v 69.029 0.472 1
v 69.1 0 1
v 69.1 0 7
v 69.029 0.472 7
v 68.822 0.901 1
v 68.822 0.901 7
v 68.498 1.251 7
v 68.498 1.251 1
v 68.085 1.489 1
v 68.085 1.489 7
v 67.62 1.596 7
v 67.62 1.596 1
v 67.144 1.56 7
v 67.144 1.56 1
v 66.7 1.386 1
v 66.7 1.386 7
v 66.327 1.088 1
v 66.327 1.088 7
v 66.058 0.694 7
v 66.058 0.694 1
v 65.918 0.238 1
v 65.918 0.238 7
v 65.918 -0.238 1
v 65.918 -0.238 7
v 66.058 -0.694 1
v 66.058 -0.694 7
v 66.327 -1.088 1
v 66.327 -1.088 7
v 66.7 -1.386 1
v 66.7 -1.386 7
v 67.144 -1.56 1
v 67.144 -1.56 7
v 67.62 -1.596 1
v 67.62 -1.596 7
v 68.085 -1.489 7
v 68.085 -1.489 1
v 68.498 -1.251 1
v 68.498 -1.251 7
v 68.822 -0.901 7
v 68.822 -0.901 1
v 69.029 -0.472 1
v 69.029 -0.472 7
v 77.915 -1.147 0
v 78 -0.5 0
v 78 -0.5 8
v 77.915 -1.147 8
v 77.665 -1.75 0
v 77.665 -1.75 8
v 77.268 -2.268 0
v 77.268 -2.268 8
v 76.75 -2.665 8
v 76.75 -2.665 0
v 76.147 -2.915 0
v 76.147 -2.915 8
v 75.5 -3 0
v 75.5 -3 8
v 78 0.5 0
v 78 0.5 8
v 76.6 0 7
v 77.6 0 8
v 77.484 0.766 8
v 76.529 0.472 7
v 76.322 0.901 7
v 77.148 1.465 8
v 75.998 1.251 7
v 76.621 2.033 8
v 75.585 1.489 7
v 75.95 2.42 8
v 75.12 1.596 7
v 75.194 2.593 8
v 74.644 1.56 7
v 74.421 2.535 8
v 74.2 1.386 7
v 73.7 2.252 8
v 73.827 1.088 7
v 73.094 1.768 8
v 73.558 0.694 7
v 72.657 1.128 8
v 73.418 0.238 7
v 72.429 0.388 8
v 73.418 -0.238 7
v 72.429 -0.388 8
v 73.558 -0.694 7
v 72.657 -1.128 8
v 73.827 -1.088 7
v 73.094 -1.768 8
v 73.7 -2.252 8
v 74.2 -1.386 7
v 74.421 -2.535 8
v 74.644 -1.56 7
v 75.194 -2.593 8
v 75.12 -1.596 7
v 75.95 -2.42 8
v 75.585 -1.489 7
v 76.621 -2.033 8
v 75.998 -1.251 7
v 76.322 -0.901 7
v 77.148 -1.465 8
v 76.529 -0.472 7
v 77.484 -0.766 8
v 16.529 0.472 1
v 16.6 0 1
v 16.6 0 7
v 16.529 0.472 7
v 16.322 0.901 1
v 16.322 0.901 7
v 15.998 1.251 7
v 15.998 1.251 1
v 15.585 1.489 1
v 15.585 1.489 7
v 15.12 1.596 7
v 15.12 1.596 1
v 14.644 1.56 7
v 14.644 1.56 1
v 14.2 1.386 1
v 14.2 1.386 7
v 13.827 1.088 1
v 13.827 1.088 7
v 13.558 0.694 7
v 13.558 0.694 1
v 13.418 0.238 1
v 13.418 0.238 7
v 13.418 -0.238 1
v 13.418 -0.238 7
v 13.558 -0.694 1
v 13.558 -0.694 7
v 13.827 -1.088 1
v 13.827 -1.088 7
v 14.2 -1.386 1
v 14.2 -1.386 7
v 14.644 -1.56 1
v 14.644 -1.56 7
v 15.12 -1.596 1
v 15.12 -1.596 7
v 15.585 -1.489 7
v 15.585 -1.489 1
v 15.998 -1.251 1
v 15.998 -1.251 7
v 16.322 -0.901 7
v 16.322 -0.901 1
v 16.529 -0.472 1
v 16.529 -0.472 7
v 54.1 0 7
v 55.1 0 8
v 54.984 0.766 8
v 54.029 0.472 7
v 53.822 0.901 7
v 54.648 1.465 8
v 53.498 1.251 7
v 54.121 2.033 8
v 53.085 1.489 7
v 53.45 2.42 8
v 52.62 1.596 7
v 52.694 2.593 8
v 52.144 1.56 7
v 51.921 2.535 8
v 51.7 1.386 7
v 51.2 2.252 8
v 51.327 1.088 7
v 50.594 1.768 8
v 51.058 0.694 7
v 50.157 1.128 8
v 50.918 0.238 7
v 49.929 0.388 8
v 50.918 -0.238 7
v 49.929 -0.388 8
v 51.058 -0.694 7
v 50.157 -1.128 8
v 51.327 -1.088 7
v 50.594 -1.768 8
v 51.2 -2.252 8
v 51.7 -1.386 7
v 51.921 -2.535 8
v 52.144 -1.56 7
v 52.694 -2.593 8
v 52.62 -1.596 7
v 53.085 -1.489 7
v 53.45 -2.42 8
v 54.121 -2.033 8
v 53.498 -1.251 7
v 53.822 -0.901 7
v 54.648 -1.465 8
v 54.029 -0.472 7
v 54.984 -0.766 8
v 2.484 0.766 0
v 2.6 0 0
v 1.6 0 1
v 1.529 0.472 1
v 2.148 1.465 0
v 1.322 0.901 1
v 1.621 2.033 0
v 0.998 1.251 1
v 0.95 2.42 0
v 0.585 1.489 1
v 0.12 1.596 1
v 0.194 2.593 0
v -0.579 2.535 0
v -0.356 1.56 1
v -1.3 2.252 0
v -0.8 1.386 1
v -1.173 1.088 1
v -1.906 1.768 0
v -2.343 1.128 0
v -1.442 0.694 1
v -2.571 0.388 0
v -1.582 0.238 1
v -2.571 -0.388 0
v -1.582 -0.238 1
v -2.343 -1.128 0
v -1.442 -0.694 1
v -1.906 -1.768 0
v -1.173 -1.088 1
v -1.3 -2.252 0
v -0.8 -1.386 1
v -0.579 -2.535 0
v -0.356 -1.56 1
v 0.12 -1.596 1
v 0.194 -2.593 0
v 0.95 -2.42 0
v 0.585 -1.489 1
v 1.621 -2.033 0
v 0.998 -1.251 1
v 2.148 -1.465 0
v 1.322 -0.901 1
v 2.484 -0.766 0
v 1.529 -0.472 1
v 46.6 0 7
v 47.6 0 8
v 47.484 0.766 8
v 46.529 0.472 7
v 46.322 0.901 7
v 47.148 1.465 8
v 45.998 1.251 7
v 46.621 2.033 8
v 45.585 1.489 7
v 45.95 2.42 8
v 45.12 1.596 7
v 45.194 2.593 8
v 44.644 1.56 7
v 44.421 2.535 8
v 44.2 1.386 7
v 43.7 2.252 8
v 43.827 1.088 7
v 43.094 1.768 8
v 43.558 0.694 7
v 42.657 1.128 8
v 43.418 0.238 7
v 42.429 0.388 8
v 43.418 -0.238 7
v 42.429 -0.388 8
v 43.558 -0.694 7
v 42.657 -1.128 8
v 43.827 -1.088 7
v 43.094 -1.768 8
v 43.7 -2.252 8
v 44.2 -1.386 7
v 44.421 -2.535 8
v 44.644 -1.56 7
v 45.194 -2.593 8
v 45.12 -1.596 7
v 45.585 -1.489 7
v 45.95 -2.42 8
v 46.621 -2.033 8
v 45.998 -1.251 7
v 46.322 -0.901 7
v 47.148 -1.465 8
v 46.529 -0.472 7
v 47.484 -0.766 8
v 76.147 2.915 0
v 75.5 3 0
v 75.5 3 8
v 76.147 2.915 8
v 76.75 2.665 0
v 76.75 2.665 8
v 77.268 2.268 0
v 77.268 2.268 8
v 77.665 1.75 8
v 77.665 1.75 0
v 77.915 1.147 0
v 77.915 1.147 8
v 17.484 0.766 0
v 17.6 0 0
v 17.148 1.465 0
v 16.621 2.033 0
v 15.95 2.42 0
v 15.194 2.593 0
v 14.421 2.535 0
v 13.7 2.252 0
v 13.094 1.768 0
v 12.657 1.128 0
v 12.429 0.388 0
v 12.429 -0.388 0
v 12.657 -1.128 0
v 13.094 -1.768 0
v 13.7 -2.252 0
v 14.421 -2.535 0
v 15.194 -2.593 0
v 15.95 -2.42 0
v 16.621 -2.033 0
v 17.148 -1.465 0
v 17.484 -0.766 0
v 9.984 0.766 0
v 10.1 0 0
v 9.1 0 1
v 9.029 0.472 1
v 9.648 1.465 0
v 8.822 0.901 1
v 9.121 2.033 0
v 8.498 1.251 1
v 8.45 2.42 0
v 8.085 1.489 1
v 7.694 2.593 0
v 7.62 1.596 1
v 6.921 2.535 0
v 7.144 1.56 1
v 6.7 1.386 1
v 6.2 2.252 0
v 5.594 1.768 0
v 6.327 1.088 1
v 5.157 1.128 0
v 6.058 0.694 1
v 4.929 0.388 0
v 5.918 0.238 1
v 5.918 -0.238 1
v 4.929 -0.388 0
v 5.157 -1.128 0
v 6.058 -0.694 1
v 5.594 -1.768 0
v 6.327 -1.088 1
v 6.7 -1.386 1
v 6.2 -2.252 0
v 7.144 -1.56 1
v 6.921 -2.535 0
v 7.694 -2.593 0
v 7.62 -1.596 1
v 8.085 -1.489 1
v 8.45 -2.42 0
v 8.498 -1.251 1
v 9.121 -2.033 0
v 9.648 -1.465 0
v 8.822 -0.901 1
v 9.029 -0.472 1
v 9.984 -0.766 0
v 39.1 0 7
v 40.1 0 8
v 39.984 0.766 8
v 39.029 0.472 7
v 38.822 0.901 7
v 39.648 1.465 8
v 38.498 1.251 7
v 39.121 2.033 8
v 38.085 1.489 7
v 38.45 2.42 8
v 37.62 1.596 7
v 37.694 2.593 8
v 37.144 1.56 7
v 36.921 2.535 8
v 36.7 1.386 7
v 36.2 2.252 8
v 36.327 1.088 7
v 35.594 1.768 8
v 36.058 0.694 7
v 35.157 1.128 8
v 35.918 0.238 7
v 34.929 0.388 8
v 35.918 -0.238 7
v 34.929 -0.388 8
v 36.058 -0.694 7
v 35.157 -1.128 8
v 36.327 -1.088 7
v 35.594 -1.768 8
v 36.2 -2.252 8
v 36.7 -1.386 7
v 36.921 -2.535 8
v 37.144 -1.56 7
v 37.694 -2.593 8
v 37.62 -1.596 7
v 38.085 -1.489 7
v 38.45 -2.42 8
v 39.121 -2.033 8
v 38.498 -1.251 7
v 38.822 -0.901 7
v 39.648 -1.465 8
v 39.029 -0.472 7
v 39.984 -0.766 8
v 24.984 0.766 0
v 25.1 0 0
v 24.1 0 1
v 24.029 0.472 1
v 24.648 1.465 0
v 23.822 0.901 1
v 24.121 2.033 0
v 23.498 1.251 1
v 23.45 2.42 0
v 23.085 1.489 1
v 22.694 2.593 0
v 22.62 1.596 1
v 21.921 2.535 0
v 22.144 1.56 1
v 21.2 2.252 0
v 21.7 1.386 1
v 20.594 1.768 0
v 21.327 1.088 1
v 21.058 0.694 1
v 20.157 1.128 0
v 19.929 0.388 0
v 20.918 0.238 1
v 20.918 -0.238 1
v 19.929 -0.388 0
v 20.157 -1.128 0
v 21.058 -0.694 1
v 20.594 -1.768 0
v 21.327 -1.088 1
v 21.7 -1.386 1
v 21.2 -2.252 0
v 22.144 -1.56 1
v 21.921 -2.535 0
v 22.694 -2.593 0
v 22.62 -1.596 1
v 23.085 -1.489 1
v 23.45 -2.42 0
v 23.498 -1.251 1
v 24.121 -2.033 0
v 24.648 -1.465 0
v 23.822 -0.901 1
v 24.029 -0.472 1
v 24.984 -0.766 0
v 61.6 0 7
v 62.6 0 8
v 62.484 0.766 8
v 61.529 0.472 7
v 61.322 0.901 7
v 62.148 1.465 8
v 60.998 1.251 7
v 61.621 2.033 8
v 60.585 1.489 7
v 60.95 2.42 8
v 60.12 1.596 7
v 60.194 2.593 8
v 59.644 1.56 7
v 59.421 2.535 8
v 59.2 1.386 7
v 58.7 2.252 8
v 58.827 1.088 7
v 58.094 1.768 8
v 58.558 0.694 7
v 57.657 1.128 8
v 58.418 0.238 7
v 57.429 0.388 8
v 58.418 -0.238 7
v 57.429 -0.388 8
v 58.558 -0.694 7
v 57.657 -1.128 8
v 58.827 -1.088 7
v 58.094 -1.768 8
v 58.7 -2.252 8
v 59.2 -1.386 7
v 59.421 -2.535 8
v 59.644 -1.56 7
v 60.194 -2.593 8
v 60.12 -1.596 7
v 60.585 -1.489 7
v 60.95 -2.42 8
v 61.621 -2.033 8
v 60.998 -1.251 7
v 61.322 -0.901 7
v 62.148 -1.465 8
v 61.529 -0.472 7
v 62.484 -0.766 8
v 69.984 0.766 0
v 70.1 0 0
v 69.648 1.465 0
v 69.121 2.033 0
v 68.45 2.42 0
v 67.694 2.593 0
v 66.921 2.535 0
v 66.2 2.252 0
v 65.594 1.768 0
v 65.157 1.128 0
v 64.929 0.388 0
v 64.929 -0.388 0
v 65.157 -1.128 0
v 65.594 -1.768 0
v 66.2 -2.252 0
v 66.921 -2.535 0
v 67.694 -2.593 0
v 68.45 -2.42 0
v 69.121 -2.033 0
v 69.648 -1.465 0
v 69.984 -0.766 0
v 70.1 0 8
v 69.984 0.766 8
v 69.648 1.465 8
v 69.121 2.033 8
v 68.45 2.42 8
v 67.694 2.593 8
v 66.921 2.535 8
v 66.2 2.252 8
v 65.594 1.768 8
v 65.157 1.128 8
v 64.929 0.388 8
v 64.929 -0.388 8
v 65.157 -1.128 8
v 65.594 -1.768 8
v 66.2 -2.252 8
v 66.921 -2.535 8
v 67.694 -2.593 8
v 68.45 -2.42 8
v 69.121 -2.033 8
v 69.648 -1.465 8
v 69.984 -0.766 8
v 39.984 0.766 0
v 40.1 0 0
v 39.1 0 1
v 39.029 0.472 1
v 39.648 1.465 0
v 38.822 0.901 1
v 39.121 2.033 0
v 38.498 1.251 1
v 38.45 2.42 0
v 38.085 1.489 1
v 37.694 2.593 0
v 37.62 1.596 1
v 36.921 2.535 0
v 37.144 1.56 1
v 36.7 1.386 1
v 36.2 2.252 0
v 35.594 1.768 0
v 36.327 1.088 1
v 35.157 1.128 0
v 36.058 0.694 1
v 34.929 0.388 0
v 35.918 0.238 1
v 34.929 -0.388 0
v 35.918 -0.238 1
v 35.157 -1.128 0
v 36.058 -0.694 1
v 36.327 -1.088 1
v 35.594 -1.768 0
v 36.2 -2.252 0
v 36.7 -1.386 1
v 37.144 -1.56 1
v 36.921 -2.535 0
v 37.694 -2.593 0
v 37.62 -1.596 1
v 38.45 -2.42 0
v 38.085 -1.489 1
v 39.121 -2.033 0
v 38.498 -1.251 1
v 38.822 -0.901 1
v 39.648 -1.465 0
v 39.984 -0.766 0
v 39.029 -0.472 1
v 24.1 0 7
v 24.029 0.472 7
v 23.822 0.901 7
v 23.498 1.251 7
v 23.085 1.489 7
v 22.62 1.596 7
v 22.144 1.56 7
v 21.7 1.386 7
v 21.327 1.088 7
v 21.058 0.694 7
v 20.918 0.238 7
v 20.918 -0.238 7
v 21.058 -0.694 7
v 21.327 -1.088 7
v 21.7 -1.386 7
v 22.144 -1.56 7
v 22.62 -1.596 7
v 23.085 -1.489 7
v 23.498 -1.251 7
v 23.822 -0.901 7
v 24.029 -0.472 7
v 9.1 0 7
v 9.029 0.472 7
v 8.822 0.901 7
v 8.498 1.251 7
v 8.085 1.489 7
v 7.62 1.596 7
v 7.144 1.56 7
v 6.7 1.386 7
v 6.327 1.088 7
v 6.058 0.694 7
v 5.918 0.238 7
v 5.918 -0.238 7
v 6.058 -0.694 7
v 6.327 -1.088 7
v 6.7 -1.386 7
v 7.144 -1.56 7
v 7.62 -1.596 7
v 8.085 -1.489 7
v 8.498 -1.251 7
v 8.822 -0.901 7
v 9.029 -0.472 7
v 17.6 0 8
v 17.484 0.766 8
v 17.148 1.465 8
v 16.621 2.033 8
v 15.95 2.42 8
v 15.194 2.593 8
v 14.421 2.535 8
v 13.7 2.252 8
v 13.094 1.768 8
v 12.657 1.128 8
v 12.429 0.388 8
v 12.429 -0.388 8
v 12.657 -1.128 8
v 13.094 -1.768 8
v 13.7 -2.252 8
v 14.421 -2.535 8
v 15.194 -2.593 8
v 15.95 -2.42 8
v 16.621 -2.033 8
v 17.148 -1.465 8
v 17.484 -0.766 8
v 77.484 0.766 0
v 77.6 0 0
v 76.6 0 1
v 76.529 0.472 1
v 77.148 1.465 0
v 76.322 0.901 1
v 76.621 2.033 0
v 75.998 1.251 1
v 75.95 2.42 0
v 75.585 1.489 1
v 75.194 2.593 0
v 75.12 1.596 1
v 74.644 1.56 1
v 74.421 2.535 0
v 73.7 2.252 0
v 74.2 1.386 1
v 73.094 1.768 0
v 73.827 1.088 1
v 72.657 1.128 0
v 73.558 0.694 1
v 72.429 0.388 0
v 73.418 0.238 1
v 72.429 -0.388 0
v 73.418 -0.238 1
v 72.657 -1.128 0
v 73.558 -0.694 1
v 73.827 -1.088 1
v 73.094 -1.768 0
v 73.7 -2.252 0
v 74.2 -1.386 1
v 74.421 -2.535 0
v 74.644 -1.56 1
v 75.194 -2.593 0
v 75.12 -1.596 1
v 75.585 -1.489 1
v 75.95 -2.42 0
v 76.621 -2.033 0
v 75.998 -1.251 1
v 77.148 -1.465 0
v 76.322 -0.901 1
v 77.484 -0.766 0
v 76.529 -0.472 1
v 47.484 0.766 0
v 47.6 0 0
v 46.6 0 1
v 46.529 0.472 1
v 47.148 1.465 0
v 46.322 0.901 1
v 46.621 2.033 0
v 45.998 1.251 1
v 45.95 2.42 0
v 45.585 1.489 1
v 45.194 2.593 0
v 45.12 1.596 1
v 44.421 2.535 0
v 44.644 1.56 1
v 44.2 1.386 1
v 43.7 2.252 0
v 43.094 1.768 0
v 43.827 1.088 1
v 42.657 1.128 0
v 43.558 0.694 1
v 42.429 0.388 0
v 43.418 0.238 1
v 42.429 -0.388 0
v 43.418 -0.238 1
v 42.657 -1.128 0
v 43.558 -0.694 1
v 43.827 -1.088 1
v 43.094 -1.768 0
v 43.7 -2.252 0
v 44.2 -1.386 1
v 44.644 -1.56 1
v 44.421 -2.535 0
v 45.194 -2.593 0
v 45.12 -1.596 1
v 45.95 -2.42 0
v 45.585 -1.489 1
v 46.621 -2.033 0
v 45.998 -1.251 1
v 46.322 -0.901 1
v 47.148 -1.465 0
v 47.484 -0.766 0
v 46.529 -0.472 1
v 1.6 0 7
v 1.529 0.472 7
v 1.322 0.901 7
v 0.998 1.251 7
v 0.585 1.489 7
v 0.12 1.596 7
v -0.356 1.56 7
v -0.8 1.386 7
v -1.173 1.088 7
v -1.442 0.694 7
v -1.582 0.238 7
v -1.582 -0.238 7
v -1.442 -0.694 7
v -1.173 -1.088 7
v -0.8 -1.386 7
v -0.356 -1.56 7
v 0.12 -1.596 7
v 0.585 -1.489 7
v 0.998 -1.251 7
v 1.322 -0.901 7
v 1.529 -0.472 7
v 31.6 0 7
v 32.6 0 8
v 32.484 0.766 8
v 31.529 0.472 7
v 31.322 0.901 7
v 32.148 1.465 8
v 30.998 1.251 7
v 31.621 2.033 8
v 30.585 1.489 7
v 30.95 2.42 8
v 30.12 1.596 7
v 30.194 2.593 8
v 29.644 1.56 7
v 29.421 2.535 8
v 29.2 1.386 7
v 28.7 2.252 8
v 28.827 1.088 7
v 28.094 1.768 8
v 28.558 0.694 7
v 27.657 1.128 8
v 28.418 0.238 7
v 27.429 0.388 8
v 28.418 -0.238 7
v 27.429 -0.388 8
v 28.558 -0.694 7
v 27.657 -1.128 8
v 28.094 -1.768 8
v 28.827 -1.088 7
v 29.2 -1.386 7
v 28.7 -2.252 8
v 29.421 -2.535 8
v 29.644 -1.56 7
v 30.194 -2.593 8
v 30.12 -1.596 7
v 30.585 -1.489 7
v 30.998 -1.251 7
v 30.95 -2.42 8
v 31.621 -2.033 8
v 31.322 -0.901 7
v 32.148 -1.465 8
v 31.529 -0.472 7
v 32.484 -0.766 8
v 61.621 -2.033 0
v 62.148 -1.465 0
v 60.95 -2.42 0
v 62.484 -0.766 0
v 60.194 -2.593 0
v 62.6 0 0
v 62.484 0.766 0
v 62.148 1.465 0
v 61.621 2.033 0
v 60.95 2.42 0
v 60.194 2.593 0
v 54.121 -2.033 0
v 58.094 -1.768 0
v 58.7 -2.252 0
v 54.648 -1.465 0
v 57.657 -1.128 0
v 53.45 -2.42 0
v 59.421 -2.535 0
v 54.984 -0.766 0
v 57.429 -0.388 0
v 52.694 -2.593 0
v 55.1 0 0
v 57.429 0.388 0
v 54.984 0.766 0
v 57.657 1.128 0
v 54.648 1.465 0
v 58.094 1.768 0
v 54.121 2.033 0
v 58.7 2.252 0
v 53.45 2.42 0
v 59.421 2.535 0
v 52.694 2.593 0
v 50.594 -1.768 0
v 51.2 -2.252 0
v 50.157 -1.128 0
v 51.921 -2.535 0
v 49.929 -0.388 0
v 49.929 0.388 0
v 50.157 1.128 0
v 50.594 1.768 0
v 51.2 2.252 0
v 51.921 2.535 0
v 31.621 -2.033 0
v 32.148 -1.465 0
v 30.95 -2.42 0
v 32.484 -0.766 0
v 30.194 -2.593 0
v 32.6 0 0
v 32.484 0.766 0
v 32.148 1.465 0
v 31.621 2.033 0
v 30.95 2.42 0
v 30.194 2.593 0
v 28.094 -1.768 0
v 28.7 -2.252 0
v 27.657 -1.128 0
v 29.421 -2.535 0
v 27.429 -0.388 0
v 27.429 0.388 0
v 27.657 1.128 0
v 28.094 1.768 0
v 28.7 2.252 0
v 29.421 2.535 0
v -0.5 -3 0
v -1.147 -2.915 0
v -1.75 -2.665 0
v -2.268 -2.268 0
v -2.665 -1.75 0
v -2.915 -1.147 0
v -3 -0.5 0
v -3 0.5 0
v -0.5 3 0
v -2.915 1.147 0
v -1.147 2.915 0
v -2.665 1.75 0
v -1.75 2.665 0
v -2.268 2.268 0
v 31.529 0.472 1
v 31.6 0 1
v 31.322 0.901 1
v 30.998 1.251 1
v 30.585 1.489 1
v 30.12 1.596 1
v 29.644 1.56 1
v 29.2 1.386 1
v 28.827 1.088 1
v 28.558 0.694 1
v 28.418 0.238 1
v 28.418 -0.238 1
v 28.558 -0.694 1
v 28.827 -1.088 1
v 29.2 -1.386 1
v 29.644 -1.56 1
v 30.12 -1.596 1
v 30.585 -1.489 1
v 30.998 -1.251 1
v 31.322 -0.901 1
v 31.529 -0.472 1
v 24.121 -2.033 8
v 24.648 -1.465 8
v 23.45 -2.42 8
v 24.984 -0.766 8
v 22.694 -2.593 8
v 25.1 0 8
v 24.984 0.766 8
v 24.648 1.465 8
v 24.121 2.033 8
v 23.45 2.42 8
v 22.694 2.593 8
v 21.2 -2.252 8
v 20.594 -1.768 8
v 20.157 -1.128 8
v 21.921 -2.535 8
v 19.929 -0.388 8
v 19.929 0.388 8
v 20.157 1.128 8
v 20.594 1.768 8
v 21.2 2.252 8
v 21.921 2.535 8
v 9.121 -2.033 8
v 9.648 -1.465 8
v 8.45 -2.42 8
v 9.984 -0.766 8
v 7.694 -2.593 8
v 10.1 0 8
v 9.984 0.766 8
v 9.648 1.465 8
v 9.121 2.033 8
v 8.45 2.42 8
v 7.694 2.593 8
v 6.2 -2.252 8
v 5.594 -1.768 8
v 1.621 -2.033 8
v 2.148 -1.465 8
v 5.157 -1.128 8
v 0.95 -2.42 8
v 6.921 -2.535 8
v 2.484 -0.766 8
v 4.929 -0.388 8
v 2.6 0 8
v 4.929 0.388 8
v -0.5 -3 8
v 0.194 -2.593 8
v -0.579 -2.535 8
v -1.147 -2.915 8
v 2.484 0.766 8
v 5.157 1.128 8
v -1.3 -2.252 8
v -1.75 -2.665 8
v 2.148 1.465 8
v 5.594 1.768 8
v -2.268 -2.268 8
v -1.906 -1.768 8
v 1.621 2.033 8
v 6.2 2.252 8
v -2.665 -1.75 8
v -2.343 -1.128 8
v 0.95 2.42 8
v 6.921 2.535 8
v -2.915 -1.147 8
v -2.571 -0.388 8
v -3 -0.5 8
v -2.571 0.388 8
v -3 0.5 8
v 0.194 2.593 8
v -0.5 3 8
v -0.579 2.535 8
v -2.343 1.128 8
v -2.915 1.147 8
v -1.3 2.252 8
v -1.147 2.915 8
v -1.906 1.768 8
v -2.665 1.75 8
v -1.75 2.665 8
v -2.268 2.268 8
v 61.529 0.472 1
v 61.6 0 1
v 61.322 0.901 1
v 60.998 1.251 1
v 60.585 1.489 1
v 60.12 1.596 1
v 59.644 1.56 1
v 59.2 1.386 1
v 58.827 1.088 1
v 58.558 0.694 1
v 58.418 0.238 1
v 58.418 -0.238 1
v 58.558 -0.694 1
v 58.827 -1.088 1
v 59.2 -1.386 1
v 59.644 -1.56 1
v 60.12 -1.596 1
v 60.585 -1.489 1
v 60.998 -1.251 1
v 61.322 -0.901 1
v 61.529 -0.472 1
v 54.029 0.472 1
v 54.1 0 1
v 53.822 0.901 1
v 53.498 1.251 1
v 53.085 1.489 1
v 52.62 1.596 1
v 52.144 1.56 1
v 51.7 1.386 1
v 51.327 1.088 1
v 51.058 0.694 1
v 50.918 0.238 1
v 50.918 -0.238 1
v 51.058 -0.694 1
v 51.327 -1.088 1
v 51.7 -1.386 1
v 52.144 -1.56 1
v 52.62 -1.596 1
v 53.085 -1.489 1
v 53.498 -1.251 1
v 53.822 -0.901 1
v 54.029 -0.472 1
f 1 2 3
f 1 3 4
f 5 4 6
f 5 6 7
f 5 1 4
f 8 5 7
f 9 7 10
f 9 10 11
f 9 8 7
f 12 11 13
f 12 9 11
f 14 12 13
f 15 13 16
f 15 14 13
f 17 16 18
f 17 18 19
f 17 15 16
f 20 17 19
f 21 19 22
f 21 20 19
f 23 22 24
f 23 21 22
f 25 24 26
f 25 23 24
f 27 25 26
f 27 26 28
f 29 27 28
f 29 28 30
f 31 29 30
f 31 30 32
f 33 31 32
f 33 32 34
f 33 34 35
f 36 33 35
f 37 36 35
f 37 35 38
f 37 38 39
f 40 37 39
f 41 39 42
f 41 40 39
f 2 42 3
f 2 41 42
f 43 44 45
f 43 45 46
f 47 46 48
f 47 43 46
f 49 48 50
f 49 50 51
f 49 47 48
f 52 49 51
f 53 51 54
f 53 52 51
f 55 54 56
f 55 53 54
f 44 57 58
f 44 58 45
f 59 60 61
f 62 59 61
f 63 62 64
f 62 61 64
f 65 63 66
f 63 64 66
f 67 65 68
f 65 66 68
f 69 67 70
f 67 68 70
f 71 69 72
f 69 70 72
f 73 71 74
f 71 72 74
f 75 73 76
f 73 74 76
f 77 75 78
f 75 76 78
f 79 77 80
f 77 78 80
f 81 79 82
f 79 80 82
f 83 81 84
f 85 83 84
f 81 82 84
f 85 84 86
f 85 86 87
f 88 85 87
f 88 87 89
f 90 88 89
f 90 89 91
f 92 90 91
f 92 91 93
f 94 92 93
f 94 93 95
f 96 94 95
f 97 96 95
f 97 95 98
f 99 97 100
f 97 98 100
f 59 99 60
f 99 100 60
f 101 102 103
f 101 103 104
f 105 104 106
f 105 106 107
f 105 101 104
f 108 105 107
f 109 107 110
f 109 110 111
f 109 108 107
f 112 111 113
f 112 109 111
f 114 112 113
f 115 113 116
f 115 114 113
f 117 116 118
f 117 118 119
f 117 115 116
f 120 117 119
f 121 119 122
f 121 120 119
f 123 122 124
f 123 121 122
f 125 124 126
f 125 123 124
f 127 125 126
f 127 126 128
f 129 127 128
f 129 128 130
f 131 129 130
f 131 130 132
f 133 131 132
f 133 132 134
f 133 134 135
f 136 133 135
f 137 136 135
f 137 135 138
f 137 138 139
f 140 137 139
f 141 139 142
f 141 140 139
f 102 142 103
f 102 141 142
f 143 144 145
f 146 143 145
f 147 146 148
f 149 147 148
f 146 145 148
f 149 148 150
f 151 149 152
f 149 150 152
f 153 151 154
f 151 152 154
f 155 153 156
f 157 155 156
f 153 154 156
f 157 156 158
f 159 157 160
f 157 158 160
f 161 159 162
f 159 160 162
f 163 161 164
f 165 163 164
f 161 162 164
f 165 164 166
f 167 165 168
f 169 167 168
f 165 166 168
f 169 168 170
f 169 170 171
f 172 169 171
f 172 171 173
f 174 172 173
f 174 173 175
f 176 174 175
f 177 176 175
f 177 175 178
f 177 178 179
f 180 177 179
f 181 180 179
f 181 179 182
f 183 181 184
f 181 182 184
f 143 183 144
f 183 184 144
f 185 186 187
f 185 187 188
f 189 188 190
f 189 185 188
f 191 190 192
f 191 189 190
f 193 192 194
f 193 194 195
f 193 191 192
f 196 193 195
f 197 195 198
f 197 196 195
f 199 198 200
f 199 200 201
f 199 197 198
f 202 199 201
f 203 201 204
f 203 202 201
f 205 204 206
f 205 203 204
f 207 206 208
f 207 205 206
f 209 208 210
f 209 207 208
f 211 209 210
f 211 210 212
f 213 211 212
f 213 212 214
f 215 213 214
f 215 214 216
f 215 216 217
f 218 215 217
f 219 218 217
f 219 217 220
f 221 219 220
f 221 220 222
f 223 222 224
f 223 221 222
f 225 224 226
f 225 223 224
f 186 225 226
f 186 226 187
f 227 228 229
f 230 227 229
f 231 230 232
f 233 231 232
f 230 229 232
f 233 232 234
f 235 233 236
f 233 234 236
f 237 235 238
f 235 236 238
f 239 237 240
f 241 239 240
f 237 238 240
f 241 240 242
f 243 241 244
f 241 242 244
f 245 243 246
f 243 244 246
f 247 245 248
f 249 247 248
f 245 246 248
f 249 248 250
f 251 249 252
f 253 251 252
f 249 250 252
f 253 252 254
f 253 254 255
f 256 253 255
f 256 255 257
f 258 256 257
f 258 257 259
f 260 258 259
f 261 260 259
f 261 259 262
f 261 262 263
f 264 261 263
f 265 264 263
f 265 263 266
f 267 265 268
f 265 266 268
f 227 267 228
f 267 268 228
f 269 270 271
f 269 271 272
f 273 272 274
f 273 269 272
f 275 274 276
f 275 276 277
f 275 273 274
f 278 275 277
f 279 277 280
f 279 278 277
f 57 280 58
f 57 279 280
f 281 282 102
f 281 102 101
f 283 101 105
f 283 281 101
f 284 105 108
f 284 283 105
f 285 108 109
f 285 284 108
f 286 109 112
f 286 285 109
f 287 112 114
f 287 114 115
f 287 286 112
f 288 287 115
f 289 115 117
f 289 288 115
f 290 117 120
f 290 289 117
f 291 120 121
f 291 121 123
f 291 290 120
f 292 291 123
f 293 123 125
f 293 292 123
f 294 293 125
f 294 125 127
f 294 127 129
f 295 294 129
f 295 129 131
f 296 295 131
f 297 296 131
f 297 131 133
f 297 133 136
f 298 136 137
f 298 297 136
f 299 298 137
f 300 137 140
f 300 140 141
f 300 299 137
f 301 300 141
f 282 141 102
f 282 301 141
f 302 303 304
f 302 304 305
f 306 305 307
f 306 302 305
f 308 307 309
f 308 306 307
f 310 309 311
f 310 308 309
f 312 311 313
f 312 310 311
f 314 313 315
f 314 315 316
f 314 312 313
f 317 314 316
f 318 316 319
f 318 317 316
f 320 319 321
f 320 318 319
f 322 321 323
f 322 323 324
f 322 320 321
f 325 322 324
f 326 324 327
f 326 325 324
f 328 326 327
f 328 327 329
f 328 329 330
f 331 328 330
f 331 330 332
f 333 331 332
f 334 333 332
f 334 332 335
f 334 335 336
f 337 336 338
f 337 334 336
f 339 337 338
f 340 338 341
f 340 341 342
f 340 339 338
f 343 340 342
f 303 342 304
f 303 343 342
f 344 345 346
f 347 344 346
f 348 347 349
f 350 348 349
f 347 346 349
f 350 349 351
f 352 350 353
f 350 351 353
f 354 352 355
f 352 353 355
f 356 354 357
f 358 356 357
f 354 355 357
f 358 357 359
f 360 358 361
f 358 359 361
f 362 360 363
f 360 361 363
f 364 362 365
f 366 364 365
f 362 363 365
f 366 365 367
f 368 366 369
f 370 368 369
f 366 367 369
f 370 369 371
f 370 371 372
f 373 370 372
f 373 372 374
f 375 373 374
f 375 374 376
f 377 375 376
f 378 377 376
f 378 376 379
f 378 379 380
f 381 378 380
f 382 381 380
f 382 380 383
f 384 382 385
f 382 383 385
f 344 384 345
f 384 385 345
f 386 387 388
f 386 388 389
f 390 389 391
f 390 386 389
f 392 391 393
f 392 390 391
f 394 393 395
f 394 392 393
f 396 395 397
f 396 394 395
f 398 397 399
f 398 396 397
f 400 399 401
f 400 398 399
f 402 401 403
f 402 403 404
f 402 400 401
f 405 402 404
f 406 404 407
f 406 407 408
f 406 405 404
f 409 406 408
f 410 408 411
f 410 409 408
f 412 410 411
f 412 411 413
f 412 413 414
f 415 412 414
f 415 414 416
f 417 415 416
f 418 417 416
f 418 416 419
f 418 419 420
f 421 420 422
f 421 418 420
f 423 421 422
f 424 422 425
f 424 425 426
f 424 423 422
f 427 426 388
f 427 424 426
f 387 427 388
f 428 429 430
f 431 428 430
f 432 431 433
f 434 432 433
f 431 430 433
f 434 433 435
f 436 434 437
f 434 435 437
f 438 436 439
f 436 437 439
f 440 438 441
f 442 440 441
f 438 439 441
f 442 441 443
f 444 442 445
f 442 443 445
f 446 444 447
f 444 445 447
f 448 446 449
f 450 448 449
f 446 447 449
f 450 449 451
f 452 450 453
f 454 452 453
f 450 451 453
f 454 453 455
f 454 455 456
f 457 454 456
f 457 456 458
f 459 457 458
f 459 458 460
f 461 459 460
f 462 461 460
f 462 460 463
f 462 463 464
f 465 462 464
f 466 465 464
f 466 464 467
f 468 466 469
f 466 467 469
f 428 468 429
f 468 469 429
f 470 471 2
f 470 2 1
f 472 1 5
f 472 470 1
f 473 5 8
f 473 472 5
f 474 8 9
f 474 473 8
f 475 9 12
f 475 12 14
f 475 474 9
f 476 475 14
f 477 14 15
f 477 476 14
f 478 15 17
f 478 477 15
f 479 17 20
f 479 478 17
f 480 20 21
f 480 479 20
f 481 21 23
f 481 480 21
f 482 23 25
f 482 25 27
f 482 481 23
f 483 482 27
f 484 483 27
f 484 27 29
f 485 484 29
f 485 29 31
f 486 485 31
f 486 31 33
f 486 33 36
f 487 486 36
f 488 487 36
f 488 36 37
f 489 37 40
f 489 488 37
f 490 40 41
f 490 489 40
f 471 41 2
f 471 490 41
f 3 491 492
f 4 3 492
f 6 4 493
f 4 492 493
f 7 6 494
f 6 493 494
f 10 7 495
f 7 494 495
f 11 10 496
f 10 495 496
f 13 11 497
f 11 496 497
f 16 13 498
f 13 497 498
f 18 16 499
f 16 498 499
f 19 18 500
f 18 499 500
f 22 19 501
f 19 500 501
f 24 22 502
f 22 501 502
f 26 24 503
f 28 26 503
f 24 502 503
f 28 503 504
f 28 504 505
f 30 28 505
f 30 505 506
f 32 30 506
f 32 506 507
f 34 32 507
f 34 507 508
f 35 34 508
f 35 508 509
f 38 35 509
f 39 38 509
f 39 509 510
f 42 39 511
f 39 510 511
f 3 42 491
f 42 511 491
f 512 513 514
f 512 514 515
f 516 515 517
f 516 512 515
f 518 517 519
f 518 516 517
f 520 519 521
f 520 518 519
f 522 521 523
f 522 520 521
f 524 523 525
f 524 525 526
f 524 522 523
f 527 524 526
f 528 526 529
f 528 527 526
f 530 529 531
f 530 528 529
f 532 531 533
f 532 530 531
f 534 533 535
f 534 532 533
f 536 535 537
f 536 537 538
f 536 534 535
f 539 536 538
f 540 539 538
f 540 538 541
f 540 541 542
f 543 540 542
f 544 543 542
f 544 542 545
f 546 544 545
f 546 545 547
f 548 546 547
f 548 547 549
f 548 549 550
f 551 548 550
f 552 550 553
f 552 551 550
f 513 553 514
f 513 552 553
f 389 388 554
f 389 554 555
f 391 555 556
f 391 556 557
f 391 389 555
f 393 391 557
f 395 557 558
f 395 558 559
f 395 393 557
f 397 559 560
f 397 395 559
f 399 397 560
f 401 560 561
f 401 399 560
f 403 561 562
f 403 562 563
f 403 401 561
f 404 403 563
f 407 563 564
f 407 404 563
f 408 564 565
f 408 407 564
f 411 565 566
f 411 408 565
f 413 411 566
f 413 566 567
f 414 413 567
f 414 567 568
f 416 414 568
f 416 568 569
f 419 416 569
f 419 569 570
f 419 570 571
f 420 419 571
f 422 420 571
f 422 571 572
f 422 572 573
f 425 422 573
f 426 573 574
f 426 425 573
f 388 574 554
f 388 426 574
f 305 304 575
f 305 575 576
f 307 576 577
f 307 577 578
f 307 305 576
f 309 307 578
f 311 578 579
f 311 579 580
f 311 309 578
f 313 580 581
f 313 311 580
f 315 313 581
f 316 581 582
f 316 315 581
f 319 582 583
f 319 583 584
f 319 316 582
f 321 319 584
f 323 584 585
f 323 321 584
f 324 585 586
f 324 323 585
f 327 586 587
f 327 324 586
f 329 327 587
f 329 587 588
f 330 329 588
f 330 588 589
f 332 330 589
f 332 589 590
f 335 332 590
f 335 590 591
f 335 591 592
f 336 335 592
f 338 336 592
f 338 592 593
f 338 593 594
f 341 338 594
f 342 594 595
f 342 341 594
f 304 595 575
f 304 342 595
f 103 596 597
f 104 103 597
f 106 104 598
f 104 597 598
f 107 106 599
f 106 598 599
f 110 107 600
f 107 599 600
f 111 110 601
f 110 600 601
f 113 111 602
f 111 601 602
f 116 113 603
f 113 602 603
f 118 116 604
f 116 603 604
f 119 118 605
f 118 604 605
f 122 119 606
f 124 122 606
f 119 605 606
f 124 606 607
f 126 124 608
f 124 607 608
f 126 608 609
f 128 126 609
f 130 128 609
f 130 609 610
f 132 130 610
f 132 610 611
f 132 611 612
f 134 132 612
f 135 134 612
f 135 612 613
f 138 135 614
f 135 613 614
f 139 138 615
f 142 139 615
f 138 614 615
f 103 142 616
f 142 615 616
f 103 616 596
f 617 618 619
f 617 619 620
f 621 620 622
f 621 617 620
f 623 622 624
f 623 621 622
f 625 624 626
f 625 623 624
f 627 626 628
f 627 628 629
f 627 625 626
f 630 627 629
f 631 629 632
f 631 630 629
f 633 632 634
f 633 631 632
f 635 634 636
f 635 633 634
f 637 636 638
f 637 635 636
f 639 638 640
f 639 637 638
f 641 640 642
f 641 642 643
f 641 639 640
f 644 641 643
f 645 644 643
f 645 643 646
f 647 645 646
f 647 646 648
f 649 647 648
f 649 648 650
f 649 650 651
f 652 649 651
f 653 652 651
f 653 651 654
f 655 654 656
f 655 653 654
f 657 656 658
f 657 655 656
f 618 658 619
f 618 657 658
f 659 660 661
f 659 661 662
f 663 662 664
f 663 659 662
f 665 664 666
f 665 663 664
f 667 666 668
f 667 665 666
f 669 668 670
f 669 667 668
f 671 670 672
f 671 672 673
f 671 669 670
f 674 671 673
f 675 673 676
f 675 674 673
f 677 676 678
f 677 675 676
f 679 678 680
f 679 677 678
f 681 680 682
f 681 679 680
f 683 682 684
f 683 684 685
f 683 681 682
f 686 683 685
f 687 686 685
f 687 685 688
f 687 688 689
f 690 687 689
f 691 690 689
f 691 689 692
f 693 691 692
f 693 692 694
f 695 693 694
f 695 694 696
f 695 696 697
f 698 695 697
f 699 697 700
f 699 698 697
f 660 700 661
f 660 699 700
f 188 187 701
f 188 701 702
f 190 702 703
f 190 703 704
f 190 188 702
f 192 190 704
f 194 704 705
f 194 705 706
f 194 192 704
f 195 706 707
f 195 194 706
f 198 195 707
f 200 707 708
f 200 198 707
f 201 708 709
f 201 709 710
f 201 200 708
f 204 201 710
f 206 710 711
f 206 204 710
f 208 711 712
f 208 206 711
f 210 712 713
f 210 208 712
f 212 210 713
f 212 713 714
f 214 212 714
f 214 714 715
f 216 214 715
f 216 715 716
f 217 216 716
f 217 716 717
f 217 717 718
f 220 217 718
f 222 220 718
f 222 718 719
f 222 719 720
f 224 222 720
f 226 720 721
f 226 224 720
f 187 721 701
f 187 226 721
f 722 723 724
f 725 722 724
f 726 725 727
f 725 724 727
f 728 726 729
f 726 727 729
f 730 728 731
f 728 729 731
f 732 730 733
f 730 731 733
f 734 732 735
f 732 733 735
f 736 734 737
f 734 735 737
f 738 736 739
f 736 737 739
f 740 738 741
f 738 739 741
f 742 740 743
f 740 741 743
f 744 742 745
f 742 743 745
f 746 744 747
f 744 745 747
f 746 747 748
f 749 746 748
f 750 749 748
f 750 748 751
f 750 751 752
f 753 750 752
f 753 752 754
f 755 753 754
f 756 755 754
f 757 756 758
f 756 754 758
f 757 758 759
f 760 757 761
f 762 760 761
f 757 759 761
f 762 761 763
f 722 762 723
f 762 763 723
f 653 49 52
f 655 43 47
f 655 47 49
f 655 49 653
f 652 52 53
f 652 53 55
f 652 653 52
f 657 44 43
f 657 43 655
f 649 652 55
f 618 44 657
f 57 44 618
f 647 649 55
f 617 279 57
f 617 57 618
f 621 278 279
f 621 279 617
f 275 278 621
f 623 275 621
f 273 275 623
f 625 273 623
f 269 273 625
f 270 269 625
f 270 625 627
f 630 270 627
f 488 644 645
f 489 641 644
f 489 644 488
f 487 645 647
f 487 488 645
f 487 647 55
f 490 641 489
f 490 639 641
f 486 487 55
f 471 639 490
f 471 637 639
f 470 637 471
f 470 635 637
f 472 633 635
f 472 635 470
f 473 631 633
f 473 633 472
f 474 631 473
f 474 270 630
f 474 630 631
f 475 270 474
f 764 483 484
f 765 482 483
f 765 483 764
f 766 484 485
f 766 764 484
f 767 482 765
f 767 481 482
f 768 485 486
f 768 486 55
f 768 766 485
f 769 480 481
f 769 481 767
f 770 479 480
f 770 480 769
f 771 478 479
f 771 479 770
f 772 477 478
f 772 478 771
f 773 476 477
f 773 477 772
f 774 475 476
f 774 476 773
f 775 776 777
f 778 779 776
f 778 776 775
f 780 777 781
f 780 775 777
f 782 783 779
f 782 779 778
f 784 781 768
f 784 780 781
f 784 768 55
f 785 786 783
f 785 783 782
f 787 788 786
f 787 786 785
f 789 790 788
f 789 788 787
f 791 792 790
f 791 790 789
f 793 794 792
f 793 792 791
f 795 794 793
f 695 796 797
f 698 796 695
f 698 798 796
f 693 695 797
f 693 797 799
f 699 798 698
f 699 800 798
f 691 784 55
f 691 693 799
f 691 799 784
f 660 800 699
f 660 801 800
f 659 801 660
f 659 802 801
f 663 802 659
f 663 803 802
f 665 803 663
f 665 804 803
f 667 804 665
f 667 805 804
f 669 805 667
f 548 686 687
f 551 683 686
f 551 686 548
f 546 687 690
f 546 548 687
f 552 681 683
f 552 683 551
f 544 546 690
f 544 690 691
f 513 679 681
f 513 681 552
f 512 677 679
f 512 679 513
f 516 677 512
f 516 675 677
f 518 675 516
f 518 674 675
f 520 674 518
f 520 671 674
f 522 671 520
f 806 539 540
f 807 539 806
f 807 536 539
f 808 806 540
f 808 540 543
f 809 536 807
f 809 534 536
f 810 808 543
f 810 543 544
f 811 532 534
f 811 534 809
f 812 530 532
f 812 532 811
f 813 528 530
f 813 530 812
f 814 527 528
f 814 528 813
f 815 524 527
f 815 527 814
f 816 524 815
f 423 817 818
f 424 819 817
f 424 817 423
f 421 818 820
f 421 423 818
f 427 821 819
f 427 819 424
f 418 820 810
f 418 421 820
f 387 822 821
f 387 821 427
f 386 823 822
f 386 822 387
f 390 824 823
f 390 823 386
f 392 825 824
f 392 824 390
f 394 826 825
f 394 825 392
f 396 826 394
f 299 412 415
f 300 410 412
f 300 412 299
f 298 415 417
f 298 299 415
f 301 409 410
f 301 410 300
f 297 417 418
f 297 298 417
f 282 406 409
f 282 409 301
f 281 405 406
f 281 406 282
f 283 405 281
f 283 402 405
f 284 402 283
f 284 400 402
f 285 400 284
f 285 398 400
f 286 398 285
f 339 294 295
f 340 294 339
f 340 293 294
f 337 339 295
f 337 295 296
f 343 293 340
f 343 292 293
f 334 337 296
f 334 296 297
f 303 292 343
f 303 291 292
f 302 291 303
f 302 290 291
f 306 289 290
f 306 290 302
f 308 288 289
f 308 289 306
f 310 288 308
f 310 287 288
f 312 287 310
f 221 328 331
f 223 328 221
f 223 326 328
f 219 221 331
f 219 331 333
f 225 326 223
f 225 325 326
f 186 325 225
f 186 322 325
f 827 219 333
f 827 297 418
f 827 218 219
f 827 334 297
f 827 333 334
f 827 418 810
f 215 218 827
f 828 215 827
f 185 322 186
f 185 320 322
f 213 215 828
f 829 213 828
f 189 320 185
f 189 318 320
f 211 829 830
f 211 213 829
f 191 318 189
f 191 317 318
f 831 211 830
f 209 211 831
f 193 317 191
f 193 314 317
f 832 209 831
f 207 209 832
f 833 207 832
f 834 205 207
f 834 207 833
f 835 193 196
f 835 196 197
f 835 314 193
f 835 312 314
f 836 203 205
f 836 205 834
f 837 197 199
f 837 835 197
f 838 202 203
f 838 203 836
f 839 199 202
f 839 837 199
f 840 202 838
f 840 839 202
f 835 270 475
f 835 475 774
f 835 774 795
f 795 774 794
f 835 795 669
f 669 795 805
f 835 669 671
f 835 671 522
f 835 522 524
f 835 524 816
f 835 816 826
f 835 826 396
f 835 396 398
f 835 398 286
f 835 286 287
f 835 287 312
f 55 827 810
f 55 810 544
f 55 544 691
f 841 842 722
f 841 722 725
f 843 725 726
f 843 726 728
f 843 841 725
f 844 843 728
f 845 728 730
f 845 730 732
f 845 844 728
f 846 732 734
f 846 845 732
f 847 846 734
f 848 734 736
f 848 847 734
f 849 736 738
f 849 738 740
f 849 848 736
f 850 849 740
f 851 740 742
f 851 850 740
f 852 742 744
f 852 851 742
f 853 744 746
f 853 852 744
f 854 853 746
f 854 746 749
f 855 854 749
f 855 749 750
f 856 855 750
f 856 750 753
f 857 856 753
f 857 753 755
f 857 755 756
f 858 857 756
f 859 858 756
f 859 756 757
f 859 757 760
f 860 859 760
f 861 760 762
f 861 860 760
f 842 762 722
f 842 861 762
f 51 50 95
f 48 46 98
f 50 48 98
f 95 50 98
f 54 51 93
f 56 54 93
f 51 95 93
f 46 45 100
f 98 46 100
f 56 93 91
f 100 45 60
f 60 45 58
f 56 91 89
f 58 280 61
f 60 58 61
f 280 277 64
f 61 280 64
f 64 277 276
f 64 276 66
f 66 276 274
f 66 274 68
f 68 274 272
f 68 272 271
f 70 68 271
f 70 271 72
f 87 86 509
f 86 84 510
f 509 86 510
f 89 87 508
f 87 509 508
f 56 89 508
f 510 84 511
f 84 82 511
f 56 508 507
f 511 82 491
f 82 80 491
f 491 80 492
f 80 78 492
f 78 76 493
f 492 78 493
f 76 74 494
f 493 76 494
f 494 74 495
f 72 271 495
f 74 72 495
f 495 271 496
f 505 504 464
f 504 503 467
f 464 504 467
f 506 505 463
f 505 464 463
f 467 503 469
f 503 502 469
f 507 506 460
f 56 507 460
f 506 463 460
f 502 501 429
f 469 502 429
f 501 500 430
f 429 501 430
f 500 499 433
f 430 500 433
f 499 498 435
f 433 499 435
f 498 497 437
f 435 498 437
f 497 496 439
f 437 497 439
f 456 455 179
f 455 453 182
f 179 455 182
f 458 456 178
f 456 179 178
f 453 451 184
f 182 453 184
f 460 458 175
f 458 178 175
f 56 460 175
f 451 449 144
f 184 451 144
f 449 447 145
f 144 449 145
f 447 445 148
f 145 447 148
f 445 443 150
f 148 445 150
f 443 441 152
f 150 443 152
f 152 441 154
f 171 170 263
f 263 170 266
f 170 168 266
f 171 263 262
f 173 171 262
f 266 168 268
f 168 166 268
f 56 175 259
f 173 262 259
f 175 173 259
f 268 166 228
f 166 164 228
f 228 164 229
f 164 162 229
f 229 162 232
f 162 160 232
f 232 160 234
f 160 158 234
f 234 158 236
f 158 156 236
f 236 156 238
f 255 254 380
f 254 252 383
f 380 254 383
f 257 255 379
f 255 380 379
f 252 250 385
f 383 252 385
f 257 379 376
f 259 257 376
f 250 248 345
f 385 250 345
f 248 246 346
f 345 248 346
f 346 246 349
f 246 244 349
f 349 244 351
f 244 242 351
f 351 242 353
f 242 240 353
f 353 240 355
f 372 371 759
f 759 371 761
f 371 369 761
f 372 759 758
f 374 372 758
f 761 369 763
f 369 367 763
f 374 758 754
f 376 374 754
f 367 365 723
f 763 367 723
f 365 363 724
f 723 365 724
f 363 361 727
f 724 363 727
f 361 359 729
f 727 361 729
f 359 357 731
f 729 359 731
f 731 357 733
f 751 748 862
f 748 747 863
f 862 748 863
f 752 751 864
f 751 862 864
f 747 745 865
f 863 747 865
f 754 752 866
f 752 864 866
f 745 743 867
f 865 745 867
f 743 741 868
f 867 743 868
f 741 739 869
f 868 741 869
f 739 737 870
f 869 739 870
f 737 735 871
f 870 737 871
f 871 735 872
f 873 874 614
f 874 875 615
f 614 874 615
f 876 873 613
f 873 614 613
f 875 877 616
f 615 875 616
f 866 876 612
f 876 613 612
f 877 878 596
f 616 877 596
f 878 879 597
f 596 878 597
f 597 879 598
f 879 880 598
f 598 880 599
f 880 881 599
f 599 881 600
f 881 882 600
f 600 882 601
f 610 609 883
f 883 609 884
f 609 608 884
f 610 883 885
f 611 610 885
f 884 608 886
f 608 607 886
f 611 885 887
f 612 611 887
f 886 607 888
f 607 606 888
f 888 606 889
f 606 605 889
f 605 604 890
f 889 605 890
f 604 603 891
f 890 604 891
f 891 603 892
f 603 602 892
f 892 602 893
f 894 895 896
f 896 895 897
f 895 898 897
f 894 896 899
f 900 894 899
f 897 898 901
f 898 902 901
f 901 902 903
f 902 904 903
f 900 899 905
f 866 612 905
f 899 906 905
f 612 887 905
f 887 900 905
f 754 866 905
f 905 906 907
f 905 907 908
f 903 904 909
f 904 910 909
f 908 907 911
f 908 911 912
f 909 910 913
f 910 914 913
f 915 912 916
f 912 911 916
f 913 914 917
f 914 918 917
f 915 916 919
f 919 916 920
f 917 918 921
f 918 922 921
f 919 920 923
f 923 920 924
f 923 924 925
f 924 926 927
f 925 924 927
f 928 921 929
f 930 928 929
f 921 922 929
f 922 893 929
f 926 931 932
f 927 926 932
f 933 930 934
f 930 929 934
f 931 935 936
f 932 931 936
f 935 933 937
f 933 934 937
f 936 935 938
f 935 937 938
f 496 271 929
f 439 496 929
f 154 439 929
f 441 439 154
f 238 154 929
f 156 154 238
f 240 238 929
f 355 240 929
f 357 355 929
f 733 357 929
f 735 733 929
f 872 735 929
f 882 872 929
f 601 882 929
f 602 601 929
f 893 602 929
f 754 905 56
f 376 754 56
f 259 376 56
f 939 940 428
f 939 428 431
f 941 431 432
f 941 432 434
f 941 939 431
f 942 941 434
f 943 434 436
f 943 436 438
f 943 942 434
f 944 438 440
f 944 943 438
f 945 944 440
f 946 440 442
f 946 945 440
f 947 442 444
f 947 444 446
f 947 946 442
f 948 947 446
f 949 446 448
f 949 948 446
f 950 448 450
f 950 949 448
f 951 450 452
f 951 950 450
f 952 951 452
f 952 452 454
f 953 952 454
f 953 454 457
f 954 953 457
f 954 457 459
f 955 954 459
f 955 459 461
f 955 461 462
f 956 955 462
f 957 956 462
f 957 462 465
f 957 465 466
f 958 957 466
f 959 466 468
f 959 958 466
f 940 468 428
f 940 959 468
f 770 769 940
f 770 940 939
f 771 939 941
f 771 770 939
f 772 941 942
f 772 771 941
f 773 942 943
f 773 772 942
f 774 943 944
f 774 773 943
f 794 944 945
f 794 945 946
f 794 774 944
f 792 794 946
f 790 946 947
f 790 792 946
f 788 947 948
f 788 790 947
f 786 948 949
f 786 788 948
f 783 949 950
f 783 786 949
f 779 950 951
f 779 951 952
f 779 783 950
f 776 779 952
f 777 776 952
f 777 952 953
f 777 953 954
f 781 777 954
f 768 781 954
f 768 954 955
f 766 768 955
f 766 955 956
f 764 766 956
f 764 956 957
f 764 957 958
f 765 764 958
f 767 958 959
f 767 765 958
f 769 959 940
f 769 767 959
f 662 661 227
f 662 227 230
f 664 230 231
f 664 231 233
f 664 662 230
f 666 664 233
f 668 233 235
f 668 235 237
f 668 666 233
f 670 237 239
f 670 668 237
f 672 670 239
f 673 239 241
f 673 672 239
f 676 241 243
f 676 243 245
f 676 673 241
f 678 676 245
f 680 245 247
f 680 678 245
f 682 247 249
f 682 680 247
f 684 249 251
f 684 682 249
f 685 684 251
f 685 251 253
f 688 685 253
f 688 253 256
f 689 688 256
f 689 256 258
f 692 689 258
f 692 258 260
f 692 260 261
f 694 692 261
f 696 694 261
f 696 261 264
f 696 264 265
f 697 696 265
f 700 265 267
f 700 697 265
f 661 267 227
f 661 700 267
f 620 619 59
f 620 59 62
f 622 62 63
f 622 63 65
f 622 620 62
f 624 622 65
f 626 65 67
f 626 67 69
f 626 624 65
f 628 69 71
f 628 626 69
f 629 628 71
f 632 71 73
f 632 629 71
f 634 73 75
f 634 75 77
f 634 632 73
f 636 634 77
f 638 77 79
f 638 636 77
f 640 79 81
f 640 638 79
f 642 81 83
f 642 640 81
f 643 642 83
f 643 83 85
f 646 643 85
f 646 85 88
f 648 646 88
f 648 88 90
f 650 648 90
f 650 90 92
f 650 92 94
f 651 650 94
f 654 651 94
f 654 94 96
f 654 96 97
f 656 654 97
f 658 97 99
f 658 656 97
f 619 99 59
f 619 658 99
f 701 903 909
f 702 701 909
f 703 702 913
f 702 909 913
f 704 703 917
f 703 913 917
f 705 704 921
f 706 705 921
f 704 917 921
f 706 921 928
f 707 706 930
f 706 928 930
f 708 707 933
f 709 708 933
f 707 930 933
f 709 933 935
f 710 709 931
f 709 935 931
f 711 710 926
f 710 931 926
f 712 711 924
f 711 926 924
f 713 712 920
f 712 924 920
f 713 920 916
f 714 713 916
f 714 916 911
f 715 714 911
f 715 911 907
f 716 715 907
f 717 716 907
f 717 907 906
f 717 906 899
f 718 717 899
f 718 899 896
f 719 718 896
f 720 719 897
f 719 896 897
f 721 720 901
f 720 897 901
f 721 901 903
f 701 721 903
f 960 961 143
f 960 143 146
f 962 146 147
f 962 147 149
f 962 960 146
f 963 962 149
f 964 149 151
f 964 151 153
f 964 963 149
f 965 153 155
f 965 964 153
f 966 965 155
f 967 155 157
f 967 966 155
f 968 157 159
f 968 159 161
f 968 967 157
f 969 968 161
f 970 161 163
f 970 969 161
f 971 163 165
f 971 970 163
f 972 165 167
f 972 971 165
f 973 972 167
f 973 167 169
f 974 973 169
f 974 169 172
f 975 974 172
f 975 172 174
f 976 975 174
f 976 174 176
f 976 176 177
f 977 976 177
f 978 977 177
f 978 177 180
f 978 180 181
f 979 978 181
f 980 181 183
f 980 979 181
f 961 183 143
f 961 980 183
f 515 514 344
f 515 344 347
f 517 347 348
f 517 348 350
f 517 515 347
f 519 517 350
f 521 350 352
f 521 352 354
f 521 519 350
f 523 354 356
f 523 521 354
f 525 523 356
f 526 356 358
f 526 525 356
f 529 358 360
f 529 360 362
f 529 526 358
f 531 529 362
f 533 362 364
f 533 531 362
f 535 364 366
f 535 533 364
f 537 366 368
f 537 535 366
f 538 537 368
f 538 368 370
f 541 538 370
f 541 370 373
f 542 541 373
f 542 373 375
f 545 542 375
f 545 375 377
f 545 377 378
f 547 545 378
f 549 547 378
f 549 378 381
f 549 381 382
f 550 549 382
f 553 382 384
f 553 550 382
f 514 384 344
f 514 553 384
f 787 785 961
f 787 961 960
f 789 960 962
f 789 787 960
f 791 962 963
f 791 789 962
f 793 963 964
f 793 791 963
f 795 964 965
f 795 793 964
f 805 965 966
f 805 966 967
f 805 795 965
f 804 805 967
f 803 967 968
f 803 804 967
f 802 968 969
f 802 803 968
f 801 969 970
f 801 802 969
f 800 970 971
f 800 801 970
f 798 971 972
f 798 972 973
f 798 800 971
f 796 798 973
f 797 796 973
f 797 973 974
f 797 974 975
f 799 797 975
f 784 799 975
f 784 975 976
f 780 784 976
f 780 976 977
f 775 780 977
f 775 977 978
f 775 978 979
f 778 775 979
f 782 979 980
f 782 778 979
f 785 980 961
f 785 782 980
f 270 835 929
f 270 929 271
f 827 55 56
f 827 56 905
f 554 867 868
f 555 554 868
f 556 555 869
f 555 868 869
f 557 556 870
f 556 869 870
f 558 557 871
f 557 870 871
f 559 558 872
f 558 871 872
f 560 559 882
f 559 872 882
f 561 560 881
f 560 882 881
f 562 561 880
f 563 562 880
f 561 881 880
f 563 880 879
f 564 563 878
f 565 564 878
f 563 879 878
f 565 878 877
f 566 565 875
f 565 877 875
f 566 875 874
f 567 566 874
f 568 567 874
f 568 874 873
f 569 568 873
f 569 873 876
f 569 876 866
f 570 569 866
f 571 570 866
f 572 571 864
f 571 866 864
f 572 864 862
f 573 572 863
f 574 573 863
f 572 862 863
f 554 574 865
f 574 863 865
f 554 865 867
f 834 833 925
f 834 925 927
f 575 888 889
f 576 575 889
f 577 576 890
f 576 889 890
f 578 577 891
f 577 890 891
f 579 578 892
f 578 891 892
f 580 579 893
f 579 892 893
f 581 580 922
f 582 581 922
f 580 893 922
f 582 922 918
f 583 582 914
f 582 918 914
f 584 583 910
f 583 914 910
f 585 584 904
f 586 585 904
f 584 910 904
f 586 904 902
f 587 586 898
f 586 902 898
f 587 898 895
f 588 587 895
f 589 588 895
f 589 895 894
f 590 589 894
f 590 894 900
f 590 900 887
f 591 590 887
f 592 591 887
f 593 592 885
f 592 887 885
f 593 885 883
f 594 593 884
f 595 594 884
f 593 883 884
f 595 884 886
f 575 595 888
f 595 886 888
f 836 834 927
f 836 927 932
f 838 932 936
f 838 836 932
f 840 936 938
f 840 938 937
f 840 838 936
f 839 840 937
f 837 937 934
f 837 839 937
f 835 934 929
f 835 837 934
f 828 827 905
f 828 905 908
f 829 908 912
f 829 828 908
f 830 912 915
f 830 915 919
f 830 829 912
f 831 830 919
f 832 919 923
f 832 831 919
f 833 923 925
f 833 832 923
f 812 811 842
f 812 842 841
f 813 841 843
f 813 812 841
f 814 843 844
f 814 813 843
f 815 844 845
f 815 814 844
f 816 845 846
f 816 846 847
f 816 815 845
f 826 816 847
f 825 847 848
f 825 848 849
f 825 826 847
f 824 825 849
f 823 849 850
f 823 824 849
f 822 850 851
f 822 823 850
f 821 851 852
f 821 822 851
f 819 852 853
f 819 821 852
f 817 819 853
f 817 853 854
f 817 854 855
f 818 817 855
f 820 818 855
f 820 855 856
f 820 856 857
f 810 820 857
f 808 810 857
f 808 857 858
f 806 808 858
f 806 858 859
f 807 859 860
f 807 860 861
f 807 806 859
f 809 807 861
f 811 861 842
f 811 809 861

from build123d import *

# Parameters (mm, degrees)
SKETCH1_R           = 1.6
BOSS_EXTRUDE1_DEPTH = 8
CHAMFER1_SIZE       = 1


with BuildPart() as part:
    # Sketch1 → Boss-Extrude1 (new body)
    with BuildSketch(Plane.XY):
        with BuildLine():
            Line((-0.5, 3), (75.5, 3))
            ThreePointArc((75.5, 3), (77.267766953, 2.267766953), (78, 0.5))
            Line((78, 0.5), (78, -0.5))
            ThreePointArc((78, -0.5), (77.267766953, -2.267766953), (75.5, -3))
            Line((75.5, -3), (-0.5, -3))
            ThreePointArc((-0.5, -3), (-2.267766953, -2.267766953), (-3, -0.5))
            Line((-3, -0.5), (-3, 0.5))
            ThreePointArc((-3, 0.5), (-2.267766953, 2.267766953), (-0.5, 3))
        make_face()
        Circle(SKETCH1_R, mode=Mode.SUBTRACT)
        with Locations((7.5, 0)):
            Circle(SKETCH1_R, mode=Mode.SUBTRACT)
        with Locations((15, 0)):
            Circle(SKETCH1_R, mode=Mode.SUBTRACT)
        with Locations((22.5, 0)):
            Circle(SKETCH1_R, mode=Mode.SUBTRACT)
        with Locations((30, 0)):
            Circle(SKETCH1_R, mode=Mode.SUBTRACT)
        with Locations((37.5, 0)):
            Circle(SKETCH1_R, mode=Mode.SUBTRACT)
        with Locations((45, 0)):
            Circle(SKETCH1_R, mode=Mode.SUBTRACT)
        with Locations((52.5, 0)):
            Circle(SKETCH1_R, mode=Mode.SUBTRACT)
        with Locations((60, 0)):
            Circle(SKETCH1_R, mode=Mode.SUBTRACT)
        with Locations((67.5, 0)):
            Circle(SKETCH1_R, mode=Mode.SUBTRACT)
        with Locations((75, 0)):
            Circle(SKETCH1_R, mode=Mode.SUBTRACT)
    extrude(amount=BOSS_EXTRUDE1_DEPTH)

    # Chamfer1
    chamfer1_edges = [part.edges().sort_by_distance(p)[0] for p in [
        (-1.6, 0, 0),
        (-1.6, 0, 8),
        (5.9, 0, 0),
        (5.9, 0, 8),
        (13.4, 0, 0),
        (13.4, 0, 8),
        (20.9, 0, 0),
        (20.9, 0, 8),
        (28.4, 0, 0),
        (28.4, 0, 8),
        (35.9, 0, 0),
        (35.9, 0, 8),
        (43.4, 0, 0),
        (43.4, 0, 8),
        (50.9, 0, 0),
        (50.9, 0, 8),
        (58.4, 0, 0),
        (58.4, 0, 8),
        (65.9, 0, 0),
        (65.9, 0, 8),
        (73.4, 0, 0),
        (73.4, 0, 8),
    ]]
    chamfer(chamfer1_edges, length=CHAMFER1_SIZE)


solid = part.part
